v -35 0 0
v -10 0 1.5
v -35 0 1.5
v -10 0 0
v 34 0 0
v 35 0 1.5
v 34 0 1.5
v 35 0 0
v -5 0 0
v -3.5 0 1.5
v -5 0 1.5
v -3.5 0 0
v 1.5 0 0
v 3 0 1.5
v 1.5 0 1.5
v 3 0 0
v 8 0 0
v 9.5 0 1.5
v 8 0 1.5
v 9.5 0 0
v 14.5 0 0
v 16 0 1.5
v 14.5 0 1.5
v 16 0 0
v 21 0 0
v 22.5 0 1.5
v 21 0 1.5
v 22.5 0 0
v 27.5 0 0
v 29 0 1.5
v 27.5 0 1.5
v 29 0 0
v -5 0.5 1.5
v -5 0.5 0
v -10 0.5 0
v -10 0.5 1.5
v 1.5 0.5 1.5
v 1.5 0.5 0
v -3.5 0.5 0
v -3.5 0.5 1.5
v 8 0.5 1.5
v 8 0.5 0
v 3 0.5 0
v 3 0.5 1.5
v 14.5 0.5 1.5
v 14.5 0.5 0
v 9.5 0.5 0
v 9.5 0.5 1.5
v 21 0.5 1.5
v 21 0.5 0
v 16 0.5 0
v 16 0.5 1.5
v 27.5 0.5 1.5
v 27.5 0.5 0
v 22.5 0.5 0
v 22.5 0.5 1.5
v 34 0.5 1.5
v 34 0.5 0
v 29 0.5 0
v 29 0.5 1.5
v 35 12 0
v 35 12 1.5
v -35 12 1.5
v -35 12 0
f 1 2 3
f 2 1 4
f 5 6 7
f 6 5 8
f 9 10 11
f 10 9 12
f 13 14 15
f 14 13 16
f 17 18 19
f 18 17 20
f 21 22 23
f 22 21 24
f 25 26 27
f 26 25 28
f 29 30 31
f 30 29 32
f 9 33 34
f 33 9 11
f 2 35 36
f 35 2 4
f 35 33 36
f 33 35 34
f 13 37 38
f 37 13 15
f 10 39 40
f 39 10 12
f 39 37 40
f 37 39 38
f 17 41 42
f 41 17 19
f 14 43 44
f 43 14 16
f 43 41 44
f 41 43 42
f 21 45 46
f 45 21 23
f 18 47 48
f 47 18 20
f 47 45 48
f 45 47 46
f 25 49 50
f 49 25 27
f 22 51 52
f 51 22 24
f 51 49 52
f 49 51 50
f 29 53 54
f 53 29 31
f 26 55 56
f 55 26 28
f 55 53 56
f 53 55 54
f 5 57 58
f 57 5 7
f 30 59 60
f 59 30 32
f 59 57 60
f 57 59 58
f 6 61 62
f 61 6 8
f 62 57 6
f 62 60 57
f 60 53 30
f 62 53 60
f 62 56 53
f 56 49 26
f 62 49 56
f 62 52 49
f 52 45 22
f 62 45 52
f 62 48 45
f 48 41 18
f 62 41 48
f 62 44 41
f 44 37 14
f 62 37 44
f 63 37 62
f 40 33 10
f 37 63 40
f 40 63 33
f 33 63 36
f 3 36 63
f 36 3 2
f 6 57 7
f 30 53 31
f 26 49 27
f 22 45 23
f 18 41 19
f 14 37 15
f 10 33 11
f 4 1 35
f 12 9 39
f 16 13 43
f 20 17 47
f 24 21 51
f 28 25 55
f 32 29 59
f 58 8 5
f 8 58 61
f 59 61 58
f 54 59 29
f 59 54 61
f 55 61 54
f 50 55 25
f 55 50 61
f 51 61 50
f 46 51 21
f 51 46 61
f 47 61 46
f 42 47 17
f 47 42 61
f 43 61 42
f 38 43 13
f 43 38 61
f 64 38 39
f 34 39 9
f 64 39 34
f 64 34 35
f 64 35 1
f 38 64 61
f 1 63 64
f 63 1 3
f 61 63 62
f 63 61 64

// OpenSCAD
// 10-well agarose gel comb, printed lying flat
// Units: mm

// ---------- Parameters ----------
plate_thickness = 1.5;    // plate (base) thickness (Z)
spine_length    = 70;     // spine/back bar length (X)
spine_width     = 12;     // spine/back bar width (Y)

tooth_count     = 10;     // number of wells/teeth
tooth_width     = 5.0;    // tooth width (X)
tooth_length    = 12;     // tooth length (Y)
tooth_depth     = 12;     // tooth depth from spine edge (Y)

gap             = 1.5;    // gap between neighbouring teeth (X)
overcut         = 0.5;    // extra length on cutting shapes past faces

$fn = 64;

// ---------- Derived ----------
teeth_span = (tooth_count - 1) * gap;   // distance first-to-last tooth centres
x_start    = -(teeth_span + gap) / 2;   // first tooth left edge (row centred)

// ---------- Model ----------
difference() {
    // Base plate
    translate([-spine_length / 2, 0, 0])
        cube([spine_length, spine_width, plate_thickness]);

    // Teeth hanging in -Y from the spine
    for (i = [0 : tooth_count - 1]) {
        translate([x_start + i * (tooth_width + gap),
                   -tooth_length,
                   0])
            cube([tooth_width, tooth_depth, plate_thickness]);
    }

    // Well cavities, cut through the plate
    for (i = [0 : tooth_count - 1]) {
        translate([x_start + i * (tooth_width + gap) - tooth_width / 2,
                   -tooth_length - overcut,
                   -overcut])
            cube([tooth_width, tooth_depth + 2 * overcut,
                  plate_thickness + 2 * overcut]);
    }
}
